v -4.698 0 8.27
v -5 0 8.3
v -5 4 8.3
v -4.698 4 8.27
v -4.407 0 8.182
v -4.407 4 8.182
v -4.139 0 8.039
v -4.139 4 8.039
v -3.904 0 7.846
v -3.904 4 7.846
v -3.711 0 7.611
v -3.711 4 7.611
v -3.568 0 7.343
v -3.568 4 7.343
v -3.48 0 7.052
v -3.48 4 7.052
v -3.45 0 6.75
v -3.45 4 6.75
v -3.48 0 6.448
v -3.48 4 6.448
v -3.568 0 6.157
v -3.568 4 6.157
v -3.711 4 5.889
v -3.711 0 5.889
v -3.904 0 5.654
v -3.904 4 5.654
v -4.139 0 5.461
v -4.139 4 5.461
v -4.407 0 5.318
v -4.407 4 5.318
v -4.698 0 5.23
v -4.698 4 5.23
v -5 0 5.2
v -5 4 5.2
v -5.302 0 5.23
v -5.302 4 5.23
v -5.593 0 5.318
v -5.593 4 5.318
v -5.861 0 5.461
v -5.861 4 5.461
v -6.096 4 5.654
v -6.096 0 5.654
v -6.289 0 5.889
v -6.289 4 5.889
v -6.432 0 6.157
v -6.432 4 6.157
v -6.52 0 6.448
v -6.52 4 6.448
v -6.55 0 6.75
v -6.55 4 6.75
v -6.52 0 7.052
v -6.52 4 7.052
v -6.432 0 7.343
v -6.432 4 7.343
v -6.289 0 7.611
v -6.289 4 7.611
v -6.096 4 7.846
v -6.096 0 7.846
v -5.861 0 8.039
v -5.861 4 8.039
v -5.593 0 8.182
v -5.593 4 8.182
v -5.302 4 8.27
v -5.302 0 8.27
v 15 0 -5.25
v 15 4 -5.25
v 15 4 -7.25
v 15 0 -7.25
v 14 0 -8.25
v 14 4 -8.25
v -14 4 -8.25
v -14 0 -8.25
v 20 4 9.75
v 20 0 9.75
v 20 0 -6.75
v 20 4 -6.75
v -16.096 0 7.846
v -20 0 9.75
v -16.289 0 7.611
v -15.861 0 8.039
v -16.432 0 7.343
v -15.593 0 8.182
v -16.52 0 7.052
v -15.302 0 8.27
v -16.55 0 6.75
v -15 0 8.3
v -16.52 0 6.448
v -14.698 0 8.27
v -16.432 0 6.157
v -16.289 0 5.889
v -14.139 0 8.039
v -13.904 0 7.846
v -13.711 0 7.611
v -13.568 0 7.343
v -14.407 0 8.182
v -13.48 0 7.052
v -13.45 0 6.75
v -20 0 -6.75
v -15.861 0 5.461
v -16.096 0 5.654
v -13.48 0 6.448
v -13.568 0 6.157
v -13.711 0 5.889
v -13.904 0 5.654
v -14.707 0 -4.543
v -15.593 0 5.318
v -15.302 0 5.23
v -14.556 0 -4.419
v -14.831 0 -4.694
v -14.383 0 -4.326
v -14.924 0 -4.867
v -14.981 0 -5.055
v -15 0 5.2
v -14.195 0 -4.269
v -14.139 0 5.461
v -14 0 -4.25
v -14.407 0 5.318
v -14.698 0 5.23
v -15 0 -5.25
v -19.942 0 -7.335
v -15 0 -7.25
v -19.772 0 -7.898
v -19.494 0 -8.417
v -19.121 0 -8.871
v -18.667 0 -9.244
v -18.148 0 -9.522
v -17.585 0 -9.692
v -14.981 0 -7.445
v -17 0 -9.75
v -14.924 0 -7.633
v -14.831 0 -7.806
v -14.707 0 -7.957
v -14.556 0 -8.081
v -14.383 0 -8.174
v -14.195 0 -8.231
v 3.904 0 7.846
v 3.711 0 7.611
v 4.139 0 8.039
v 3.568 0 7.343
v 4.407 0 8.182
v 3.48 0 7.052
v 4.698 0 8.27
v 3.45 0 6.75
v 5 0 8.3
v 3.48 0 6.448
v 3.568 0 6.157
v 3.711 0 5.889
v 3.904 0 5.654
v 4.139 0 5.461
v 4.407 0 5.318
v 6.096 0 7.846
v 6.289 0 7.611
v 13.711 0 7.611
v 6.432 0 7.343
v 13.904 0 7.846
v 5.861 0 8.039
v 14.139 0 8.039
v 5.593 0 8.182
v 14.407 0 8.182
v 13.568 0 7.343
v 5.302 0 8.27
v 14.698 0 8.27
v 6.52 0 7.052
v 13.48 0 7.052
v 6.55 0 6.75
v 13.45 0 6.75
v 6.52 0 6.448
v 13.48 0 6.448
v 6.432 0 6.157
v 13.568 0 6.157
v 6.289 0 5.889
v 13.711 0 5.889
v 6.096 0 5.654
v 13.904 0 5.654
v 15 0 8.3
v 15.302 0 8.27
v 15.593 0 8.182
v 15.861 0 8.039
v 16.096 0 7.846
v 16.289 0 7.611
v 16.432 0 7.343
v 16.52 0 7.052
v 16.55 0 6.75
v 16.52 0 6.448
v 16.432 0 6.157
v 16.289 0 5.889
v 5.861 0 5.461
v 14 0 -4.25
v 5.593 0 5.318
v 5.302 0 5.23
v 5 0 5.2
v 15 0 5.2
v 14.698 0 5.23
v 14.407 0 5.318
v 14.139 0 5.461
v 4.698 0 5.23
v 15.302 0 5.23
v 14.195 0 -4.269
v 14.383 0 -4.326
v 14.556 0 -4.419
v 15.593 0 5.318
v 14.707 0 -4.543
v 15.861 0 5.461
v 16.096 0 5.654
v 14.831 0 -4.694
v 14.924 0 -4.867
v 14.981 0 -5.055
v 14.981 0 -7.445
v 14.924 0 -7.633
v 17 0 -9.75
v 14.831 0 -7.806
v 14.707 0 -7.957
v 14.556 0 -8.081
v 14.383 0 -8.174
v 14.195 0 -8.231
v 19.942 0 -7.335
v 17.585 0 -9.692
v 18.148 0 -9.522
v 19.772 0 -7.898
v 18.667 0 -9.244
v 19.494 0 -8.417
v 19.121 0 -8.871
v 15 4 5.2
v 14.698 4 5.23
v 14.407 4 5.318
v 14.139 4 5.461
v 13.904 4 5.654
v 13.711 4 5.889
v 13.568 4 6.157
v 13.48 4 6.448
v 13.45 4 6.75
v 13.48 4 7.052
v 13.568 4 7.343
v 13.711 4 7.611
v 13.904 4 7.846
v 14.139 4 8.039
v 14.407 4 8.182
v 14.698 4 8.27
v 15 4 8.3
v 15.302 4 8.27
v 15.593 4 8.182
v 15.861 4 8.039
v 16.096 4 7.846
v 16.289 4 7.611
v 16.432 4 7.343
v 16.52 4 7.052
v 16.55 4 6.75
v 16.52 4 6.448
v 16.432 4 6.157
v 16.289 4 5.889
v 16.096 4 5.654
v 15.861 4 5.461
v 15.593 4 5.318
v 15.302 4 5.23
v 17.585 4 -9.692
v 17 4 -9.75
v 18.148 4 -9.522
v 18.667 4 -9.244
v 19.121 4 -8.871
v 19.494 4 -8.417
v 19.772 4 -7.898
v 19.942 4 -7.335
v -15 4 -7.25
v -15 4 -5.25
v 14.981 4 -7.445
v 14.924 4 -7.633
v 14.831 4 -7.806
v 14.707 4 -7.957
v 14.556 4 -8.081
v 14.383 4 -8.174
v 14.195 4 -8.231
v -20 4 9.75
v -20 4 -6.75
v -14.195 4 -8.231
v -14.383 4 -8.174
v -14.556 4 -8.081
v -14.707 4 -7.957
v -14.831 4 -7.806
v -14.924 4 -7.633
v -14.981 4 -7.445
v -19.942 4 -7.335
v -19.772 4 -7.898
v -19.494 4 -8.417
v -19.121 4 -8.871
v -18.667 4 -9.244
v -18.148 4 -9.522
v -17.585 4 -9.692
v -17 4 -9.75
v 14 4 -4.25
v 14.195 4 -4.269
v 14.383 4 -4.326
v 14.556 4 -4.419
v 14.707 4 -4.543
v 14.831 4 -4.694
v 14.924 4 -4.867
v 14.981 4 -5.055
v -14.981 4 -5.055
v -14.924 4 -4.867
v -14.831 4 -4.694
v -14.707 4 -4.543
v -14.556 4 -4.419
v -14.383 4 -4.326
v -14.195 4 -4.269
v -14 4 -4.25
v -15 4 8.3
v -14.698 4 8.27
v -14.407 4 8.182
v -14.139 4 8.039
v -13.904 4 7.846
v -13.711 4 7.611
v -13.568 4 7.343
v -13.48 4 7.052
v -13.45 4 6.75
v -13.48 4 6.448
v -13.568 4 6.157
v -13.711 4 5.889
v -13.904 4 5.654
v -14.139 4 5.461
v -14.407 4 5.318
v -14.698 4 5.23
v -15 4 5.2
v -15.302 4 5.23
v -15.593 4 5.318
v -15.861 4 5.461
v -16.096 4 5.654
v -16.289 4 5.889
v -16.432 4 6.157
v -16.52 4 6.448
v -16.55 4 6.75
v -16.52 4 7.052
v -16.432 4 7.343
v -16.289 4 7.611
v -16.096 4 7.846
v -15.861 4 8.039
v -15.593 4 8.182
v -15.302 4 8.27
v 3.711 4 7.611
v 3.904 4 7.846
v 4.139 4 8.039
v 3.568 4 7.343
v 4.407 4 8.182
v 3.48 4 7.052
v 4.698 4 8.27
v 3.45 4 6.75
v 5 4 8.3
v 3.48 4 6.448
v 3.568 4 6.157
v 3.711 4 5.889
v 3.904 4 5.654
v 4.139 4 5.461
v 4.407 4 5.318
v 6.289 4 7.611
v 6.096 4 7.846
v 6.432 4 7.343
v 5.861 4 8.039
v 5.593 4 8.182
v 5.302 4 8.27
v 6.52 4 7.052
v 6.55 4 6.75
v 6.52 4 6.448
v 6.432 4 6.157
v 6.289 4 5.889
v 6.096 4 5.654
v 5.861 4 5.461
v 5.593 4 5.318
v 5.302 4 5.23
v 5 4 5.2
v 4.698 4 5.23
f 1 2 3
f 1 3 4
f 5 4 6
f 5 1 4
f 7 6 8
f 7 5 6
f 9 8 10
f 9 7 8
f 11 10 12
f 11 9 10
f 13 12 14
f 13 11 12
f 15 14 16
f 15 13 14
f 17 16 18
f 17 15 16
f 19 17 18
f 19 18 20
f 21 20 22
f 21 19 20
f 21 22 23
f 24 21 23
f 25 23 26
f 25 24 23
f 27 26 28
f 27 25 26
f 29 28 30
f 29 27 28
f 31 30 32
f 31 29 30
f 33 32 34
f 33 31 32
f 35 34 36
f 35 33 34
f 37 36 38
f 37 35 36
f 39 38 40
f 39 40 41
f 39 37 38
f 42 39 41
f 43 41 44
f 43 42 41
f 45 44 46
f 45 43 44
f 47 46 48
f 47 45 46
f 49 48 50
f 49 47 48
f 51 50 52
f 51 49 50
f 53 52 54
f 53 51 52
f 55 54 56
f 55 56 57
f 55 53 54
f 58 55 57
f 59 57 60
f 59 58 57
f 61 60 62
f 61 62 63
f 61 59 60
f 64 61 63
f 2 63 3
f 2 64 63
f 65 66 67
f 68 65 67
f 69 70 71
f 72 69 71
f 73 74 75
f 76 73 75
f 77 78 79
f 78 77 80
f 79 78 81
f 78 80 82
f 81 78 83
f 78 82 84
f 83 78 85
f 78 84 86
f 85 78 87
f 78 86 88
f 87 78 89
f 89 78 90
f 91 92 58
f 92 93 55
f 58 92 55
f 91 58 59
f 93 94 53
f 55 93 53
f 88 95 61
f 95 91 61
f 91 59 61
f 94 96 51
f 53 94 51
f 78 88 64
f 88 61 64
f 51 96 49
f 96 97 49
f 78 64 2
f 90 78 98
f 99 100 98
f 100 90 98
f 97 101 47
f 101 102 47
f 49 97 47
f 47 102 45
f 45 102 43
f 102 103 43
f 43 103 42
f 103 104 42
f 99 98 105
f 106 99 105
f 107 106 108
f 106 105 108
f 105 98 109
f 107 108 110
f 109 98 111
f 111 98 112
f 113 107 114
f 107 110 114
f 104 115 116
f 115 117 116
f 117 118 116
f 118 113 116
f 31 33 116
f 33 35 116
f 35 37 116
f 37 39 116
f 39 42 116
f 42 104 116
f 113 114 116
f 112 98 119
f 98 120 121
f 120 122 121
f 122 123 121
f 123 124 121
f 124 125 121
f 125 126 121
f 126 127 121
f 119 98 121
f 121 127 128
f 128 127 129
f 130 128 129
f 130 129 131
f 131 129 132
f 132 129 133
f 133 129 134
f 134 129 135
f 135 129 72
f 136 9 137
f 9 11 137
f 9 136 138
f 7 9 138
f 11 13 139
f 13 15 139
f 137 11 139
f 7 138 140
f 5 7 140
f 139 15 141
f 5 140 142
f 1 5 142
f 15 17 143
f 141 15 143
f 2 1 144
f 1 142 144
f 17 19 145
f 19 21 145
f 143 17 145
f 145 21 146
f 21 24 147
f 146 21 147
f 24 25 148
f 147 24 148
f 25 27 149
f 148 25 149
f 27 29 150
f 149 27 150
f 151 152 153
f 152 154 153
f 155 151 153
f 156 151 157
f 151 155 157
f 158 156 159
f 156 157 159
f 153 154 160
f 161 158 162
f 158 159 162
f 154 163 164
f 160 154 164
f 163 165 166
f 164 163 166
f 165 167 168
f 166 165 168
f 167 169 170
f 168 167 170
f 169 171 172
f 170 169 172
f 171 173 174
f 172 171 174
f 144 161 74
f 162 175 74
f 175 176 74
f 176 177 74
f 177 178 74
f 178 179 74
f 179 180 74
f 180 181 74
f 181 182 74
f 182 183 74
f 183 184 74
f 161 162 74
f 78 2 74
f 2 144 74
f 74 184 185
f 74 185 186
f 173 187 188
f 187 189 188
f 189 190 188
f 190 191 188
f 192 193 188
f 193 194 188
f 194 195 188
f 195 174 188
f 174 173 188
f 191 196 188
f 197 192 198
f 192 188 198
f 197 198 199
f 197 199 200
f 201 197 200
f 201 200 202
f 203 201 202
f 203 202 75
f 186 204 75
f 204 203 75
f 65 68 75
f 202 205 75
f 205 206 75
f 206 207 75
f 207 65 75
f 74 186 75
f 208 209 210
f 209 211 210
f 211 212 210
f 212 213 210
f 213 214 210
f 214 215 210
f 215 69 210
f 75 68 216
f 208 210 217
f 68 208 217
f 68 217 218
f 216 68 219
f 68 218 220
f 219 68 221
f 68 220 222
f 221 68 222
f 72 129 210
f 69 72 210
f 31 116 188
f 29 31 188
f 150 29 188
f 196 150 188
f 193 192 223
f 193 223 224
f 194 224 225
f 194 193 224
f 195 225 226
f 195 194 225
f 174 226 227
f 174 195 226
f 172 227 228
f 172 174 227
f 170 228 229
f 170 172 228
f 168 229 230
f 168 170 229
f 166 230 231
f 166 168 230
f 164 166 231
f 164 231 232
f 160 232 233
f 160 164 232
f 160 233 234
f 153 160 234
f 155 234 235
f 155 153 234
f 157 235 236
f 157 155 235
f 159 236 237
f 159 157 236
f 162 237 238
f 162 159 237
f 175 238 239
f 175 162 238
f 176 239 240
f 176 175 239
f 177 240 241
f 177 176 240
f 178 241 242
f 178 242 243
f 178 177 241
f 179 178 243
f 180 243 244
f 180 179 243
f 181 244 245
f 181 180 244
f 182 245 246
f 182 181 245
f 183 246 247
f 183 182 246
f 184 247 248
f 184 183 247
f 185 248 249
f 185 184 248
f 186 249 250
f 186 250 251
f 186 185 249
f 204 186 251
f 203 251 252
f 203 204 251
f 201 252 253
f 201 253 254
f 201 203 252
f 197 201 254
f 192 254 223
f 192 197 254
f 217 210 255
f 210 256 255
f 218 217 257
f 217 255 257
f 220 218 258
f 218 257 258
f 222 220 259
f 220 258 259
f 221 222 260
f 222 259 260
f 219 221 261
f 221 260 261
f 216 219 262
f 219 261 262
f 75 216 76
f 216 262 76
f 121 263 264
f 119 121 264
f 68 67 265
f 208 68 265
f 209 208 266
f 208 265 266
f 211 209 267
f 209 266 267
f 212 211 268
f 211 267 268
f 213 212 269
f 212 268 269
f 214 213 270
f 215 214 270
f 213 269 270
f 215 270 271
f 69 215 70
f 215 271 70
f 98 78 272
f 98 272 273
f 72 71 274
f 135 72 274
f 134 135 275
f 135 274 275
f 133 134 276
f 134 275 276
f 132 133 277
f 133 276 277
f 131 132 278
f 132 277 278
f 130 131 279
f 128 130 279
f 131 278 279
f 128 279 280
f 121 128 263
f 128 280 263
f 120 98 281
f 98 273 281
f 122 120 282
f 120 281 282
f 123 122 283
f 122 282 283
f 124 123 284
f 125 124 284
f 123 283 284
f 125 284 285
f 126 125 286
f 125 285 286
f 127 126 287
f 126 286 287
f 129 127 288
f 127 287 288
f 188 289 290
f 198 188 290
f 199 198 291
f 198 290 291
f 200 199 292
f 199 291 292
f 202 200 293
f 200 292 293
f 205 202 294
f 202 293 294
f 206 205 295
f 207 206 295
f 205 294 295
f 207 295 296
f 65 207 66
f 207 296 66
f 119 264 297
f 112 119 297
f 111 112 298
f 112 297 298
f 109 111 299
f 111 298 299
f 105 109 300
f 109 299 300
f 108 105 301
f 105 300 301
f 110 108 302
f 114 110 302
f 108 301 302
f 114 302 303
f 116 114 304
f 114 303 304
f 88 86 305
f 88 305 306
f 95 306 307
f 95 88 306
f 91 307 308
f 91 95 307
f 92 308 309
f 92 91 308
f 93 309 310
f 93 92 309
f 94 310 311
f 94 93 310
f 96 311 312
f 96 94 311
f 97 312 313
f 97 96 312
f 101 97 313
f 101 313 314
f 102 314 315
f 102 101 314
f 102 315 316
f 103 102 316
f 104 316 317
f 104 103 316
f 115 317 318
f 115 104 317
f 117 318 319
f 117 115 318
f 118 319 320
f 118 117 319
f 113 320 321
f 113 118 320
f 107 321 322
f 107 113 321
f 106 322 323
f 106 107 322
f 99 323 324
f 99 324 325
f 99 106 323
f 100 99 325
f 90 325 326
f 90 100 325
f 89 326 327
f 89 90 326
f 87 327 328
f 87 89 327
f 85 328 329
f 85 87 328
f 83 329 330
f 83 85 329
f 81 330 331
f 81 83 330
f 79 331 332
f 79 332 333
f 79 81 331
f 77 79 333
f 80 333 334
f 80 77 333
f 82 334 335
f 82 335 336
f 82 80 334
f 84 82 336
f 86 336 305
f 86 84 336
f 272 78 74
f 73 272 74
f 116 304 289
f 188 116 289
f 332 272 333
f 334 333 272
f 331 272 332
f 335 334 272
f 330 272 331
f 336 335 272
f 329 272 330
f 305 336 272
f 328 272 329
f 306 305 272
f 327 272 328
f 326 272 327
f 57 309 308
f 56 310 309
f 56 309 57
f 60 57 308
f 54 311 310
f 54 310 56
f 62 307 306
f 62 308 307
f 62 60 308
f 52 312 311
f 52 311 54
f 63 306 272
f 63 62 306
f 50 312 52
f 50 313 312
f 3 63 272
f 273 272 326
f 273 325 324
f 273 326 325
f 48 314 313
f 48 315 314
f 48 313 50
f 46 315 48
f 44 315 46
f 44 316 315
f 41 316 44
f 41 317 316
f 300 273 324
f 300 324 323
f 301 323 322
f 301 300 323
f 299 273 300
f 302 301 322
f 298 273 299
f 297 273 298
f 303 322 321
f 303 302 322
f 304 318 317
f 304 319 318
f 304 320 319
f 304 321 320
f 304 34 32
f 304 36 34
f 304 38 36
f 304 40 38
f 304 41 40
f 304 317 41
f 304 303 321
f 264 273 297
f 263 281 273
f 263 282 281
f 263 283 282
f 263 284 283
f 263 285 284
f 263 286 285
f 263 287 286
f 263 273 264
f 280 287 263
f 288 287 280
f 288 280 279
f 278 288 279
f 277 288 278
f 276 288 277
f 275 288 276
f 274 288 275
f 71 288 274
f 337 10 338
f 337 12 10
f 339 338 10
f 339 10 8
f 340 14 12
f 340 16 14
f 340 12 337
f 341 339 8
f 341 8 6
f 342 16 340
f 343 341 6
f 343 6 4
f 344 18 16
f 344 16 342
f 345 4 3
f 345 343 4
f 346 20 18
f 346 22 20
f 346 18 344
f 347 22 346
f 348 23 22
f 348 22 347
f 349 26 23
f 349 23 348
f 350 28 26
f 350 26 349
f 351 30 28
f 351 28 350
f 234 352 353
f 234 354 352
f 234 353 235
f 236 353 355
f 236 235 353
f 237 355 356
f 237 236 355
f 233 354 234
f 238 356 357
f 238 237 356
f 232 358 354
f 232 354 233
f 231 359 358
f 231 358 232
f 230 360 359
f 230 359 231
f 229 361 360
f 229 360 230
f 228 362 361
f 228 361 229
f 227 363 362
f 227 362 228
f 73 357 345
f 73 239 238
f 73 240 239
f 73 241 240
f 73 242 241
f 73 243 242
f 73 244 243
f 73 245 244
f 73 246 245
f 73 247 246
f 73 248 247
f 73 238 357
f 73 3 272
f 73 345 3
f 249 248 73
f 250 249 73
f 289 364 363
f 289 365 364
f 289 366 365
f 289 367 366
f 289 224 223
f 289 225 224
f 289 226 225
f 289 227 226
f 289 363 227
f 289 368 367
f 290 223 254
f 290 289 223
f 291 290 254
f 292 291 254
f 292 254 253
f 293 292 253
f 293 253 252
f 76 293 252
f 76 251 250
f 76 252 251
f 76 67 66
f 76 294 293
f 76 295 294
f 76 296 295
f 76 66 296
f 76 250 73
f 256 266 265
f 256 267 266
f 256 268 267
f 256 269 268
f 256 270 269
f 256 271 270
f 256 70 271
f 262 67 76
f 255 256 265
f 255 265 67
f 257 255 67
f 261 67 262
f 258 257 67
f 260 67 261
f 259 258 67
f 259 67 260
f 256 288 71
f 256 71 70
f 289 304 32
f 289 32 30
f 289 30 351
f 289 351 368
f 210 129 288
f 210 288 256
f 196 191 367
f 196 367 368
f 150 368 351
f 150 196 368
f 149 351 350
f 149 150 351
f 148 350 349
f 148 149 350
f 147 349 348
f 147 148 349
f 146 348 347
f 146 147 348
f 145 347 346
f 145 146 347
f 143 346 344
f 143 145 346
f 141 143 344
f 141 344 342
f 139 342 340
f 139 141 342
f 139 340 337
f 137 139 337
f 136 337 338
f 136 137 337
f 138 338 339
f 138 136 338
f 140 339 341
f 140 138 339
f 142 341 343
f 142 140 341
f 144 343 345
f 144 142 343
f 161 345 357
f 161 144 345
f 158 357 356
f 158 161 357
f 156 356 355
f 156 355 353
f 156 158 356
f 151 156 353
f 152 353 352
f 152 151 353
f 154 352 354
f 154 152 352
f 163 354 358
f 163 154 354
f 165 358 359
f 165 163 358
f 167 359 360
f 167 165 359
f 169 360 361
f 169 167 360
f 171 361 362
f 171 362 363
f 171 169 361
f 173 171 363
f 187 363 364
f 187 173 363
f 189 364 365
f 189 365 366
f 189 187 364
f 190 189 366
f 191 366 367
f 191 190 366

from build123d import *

# Parameters (mm, degrees)
SKETCH_1_W          = 40
SKETCH_1_H          = 19.5
SKETCH_1_R          = 1.55
EXTRUDE_1_DEPTH     = 4
CUT_EXTRUDE_1_DEPTH = 4
FILLET_1_R          = 3


with BuildPart() as part:
    # 草图1 → 凸台-拉伸1 (new body)
    with BuildSketch(Plane(origin=(0, 0, 0), x_dir=(1, 0, 0), z_dir=(0, 1, 0))):
        Rectangle(SKETCH_1_W, SKETCH_1_H)
        with Locations(Location((-15, -6.75, 0), (0, 0, 270))):
            Circle(SKETCH_1_R, mode=Mode.SUBTRACT)
        with Locations(Location((-5, -6.75, 0), (0, 0, 270))):
            Circle(SKETCH_1_R, mode=Mode.SUBTRACT)
        with Locations(Location((15, -6.75, 0), (0, 0, 90))):
            Circle(SKETCH_1_R, mode=Mode.SUBTRACT)
        with Locations(Location((5, -6.75, 0), (0, 0, 90))):
            Circle(SKETCH_1_R, mode=Mode.SUBTRACT)
    extrude(amount=EXTRUDE_1_DEPTH)

    # 草图2 → 切除-拉伸1 (cut)
    with BuildSketch(Plane(origin=(0, 4, 0), x_dir=(1, 0, 0), z_dir=(0, 1, 0))):
        with BuildLine():
            Line((-14, 4.25), (14, 4.25))
            ThreePointArc((14, 4.25), (14.707106781, 4.542893219), (15, 5.25))
            Line((15, 5.25), (15, 7.25))
            ThreePointArc((15, 7.25), (14.707106781, 7.957106781), (14, 8.25))
            Line((14, 8.25), (-14, 8.25))
            ThreePointArc((-14, 8.25), (-14.707106781, 7.957106781), (-15, 7.25))
            Line((-15, 7.25), (-15, 5.25))
            ThreePointArc((-15, 5.25), (-14.707106781, 4.542893219), (-14, 4.25))
        make_face()
    extrude(amount=-CUT_EXTRUDE_1_DEPTH, mode=Mode.SUBTRACT)

    # 圆角1
    fillet_1_edges = [part.edges().sort_by_distance(p)[0] for p in [
        (-20, 2, -9.75),
        (20, 2, -9.75),
    ]]
    fillet(fillet_1_edges, radius=FILLET_1_R)


solid = part.part
